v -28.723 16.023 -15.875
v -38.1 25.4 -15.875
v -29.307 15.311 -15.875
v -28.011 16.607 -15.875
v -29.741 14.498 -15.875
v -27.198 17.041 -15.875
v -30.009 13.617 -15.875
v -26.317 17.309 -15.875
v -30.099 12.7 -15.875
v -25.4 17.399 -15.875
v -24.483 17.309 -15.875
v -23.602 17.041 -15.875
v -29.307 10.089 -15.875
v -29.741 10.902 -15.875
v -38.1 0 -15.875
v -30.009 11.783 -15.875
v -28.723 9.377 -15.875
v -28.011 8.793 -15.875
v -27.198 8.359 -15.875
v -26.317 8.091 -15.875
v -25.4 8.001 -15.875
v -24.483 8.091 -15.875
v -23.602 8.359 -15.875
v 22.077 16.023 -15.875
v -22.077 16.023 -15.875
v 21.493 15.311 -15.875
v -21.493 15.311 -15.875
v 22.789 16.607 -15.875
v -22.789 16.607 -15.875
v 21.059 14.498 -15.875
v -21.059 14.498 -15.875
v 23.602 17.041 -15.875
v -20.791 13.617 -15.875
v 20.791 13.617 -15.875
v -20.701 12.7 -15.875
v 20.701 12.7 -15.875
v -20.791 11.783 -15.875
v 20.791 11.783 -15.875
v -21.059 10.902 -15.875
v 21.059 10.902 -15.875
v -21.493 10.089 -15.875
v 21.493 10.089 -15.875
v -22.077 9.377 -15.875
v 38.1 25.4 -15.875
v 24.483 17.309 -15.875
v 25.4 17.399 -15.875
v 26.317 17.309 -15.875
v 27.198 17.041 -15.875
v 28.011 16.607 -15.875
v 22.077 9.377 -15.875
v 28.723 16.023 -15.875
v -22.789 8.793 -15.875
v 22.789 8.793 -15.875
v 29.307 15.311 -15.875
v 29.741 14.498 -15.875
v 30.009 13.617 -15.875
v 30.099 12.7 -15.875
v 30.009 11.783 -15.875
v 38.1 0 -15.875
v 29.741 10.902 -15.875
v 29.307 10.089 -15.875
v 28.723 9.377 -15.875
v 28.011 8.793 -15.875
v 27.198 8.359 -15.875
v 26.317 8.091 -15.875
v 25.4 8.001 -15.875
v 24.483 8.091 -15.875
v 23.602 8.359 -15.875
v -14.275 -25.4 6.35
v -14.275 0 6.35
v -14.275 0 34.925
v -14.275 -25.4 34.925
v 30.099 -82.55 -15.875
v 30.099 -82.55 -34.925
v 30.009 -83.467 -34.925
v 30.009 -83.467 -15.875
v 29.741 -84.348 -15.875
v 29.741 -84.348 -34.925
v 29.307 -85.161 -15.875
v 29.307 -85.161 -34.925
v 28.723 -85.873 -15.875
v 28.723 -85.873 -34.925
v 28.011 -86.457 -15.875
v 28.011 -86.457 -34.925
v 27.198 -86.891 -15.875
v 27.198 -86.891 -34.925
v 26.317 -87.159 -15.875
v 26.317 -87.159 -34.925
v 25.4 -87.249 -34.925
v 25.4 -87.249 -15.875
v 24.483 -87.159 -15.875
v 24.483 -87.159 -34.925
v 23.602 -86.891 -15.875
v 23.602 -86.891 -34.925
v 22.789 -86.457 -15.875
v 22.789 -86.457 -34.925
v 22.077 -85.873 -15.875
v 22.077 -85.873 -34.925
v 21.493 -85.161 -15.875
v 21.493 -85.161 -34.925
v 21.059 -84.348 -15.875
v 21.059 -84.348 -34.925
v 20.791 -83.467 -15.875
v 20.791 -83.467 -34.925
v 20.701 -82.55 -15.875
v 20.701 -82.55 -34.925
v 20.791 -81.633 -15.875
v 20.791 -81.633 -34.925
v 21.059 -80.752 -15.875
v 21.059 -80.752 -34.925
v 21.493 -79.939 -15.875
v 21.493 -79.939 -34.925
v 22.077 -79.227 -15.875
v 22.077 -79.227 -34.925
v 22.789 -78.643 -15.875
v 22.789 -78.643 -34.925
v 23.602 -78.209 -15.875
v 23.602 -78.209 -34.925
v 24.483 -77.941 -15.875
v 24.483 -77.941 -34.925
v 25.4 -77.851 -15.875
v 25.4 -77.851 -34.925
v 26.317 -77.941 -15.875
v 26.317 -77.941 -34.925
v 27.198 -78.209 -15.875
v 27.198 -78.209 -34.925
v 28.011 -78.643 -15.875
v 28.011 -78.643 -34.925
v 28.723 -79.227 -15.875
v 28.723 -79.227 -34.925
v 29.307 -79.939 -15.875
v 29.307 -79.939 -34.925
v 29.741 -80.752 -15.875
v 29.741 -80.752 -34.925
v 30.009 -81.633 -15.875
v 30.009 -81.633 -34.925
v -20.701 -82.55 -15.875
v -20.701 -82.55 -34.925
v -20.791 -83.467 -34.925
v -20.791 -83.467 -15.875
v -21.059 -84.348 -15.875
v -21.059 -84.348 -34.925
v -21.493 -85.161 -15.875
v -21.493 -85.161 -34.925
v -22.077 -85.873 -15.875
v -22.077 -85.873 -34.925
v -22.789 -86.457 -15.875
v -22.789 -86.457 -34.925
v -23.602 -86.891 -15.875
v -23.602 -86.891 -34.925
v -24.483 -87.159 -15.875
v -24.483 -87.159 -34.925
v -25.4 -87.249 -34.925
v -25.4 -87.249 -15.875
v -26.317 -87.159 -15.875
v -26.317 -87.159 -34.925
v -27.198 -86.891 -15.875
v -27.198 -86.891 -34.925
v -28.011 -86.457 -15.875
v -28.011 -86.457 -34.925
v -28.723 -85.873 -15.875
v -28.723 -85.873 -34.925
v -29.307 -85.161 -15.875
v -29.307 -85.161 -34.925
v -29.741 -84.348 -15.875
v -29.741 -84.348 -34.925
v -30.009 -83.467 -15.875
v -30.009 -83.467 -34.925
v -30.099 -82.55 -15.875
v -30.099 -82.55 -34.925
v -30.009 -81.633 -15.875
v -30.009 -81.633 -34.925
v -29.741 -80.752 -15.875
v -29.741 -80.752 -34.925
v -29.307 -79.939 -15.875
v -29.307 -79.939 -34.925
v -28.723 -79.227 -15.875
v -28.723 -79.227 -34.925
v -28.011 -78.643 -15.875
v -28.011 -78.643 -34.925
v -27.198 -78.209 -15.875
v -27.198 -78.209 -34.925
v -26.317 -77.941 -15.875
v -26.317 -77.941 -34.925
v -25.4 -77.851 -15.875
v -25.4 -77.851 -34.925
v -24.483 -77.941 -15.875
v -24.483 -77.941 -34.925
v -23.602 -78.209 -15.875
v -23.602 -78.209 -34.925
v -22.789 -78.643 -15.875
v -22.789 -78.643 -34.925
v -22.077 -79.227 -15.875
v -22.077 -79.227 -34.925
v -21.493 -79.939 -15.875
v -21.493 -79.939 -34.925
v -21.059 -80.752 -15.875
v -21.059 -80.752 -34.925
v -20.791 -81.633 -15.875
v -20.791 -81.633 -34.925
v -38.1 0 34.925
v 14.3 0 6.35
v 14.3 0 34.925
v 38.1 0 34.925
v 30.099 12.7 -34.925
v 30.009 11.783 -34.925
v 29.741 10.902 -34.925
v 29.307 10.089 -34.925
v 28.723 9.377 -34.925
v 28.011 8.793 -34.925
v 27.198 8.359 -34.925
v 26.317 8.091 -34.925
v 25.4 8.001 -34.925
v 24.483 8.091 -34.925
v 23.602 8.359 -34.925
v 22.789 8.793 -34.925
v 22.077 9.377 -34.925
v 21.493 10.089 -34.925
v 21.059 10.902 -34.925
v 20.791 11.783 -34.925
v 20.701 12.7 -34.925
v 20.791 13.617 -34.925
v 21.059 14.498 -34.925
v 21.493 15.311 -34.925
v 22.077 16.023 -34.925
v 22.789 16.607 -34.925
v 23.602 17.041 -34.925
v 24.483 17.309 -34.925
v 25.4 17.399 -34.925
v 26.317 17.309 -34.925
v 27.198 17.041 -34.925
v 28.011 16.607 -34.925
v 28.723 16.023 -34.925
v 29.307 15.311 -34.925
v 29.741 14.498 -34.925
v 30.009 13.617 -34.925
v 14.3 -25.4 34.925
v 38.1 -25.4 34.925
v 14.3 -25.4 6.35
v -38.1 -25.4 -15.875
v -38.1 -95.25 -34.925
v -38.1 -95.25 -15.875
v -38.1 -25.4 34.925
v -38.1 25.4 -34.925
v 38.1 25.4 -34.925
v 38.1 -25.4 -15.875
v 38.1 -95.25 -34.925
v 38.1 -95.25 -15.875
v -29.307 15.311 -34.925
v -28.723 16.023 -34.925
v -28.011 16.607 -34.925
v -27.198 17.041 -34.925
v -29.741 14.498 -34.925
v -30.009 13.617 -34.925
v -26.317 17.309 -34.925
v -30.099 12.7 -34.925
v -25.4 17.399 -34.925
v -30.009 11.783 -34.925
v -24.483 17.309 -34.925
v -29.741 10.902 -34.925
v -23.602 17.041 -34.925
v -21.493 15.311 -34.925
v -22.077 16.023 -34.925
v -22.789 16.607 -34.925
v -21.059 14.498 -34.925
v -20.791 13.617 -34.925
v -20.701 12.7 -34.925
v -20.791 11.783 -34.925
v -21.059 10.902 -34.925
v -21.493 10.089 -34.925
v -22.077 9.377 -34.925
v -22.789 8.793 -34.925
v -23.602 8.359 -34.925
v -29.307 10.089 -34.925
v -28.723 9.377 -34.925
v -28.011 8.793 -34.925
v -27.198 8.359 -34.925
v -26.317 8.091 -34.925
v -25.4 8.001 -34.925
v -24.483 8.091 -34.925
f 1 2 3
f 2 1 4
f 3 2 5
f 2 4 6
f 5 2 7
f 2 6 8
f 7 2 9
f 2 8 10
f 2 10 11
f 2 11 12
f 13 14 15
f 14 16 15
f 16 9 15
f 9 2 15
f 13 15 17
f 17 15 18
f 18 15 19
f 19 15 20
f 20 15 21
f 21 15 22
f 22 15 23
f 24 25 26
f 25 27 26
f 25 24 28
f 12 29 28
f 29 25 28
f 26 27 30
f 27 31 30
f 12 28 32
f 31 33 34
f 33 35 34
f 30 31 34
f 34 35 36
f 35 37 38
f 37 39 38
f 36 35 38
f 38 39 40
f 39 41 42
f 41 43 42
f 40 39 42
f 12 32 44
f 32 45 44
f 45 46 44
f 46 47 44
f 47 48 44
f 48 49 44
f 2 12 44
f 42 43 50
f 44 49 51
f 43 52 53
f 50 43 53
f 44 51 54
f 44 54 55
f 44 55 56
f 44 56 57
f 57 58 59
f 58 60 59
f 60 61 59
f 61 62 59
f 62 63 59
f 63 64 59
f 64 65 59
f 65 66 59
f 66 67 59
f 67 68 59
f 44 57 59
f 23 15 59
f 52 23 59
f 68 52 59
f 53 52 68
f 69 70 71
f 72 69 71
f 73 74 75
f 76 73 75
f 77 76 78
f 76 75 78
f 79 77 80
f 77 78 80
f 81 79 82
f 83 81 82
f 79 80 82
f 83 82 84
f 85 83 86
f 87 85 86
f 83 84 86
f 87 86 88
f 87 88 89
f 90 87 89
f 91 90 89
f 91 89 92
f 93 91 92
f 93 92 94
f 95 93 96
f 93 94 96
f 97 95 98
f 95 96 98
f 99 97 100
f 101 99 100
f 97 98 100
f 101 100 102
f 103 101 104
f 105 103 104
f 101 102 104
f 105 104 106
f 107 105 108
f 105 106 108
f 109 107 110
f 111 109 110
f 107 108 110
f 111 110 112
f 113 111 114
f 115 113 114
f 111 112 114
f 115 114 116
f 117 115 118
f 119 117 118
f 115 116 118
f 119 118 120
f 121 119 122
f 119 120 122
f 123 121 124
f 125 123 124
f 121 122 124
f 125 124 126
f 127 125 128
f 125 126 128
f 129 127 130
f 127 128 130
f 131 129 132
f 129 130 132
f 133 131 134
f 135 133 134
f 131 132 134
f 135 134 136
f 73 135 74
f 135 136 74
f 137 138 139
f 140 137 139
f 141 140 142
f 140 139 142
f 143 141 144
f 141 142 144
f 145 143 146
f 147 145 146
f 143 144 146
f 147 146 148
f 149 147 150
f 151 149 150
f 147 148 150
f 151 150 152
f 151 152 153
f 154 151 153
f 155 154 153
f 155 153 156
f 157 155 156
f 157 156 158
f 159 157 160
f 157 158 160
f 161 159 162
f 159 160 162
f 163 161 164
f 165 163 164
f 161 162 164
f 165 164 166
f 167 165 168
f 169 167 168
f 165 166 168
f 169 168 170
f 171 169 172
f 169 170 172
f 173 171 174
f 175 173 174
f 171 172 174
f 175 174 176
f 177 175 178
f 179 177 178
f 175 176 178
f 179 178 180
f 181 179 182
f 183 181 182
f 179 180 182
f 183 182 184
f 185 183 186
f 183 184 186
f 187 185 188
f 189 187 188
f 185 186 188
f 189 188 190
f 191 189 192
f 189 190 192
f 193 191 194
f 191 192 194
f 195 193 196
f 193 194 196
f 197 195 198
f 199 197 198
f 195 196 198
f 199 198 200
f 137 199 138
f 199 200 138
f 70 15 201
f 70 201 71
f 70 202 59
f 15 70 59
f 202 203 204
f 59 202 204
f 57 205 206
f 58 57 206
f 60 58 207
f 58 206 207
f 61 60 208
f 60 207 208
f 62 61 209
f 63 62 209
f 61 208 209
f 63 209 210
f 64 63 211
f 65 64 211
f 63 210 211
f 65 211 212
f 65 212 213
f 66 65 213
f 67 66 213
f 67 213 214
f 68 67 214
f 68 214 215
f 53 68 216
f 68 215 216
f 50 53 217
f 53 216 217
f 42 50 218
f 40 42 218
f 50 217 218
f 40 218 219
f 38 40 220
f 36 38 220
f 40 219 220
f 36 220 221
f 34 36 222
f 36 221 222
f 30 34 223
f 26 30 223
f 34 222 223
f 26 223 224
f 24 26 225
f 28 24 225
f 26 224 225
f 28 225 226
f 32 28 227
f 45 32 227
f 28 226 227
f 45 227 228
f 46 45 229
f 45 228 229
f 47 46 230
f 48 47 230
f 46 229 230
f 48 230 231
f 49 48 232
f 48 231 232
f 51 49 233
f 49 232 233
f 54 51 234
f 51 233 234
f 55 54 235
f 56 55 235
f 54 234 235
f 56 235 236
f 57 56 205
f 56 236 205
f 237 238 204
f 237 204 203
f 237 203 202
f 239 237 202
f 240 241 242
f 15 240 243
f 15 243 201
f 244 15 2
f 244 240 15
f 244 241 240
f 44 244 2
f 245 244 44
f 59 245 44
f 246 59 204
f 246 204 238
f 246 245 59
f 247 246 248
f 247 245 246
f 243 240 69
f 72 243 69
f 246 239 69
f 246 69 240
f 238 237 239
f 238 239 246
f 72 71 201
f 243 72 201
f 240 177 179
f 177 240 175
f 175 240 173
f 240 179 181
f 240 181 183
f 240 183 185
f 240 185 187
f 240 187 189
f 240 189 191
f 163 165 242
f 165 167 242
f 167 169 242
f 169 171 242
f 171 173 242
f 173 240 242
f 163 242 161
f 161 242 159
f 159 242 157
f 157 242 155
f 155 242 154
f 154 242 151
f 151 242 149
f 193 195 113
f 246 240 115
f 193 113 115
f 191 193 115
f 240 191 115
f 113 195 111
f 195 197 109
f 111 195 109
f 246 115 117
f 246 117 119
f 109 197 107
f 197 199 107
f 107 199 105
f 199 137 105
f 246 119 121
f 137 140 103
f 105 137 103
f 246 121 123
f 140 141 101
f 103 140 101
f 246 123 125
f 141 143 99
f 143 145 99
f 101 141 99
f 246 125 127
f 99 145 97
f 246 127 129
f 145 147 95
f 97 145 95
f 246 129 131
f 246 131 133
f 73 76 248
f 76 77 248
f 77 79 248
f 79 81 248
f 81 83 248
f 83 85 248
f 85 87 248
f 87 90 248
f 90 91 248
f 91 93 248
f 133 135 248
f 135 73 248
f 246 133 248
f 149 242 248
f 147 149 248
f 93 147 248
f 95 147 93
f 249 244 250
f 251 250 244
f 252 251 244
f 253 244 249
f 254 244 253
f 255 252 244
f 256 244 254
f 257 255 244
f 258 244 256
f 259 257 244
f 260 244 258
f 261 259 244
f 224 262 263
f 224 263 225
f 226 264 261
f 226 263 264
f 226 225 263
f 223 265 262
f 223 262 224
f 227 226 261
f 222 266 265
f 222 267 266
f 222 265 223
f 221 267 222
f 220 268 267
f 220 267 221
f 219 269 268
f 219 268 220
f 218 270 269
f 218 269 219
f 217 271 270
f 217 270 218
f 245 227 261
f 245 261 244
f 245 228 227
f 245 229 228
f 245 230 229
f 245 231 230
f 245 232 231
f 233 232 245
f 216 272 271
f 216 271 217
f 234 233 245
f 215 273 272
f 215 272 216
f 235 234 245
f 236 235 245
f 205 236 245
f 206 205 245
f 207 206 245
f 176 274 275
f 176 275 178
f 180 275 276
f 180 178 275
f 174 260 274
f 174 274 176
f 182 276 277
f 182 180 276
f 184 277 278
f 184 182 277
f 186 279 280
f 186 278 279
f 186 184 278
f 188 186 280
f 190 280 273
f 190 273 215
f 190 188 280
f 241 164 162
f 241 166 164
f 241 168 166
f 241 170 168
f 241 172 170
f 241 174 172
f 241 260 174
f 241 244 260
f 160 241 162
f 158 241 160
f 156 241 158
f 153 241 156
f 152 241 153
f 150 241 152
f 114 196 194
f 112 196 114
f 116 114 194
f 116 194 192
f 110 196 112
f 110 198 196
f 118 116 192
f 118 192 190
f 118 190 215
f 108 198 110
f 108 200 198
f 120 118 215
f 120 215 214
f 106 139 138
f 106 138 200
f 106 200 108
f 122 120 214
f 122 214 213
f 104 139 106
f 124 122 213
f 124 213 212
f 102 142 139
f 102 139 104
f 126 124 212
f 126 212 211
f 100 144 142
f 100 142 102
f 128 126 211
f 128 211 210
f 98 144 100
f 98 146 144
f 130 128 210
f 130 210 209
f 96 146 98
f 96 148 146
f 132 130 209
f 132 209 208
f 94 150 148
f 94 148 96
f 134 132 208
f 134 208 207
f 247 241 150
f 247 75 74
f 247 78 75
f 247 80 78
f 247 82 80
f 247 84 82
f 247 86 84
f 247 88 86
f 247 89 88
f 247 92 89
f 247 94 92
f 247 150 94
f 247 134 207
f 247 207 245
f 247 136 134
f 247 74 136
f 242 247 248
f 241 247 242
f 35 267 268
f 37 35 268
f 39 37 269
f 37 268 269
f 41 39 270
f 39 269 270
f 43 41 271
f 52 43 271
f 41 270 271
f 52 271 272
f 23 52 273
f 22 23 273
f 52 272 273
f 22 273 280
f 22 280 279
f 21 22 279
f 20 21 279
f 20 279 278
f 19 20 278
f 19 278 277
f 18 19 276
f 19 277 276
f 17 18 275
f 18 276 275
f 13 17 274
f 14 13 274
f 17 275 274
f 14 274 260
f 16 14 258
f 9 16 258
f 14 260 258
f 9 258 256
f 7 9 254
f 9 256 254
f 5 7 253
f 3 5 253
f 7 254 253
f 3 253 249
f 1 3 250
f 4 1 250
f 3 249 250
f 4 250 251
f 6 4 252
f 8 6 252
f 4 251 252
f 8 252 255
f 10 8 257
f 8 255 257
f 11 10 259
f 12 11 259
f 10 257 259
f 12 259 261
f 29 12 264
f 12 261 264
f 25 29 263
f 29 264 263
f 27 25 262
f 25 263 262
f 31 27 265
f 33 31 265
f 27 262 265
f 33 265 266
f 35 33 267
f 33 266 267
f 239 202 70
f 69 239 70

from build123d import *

# Parameters (mm, degrees)
F1_DEPTH = 25.4
F2_R     = 4.699
F3_DEPTH = 19.05


with BuildPart() as f1:
    # F0 (on Front) → F1 (new body)
    with BuildSketch(Plane.XZ):
        Polygon((-38.1, -34.925), (38.1, -34.925), (38.1, 34.925), (14.3002, 34.925), (14.3002, 6.35), (-14.2748, 6.35), (-14.2748, 34.925), (-38.1, 34.925), align=None)
    extrude(amount=F1_DEPTH)

    # F2 (on face) → F3 (join)
    with BuildSketch(Plane(origin=(0, 0, -34.925), x_dir=(1, 0, 0), z_dir=(0, 0, -1))):
        Polygon((-38.1, 25.4), (38.1, 25.4), (38.1, 82.55), (38.1, 95.25), (25.4, 95.25), (-25.4, 95.25), (-38.1, 95.25), (-38.1, 82.55), align=None)
        with Locations((-25.4, 82.55)):
            Circle(F2_R, mode=Mode.SUBTRACT)
        with Locations((25.4, 82.55)):
            Circle(F2_R, mode=Mode.SUBTRACT)
        Polygon((38.1, -12.7), (38.1, 0), (-38.1, 0), (-38.1, -25.4), (25.4, -25.4), (38.1, -25.4), align=None)
        with Locations((-25.4, -12.7)):
            Circle(F2_R, mode=Mode.SUBTRACT)
        with Locations((25.4, -12.7)):
            Circle(F2_R, mode=Mode.SUBTRACT)
    extrude(amount=-F3_DEPTH)


solid = f1.part
